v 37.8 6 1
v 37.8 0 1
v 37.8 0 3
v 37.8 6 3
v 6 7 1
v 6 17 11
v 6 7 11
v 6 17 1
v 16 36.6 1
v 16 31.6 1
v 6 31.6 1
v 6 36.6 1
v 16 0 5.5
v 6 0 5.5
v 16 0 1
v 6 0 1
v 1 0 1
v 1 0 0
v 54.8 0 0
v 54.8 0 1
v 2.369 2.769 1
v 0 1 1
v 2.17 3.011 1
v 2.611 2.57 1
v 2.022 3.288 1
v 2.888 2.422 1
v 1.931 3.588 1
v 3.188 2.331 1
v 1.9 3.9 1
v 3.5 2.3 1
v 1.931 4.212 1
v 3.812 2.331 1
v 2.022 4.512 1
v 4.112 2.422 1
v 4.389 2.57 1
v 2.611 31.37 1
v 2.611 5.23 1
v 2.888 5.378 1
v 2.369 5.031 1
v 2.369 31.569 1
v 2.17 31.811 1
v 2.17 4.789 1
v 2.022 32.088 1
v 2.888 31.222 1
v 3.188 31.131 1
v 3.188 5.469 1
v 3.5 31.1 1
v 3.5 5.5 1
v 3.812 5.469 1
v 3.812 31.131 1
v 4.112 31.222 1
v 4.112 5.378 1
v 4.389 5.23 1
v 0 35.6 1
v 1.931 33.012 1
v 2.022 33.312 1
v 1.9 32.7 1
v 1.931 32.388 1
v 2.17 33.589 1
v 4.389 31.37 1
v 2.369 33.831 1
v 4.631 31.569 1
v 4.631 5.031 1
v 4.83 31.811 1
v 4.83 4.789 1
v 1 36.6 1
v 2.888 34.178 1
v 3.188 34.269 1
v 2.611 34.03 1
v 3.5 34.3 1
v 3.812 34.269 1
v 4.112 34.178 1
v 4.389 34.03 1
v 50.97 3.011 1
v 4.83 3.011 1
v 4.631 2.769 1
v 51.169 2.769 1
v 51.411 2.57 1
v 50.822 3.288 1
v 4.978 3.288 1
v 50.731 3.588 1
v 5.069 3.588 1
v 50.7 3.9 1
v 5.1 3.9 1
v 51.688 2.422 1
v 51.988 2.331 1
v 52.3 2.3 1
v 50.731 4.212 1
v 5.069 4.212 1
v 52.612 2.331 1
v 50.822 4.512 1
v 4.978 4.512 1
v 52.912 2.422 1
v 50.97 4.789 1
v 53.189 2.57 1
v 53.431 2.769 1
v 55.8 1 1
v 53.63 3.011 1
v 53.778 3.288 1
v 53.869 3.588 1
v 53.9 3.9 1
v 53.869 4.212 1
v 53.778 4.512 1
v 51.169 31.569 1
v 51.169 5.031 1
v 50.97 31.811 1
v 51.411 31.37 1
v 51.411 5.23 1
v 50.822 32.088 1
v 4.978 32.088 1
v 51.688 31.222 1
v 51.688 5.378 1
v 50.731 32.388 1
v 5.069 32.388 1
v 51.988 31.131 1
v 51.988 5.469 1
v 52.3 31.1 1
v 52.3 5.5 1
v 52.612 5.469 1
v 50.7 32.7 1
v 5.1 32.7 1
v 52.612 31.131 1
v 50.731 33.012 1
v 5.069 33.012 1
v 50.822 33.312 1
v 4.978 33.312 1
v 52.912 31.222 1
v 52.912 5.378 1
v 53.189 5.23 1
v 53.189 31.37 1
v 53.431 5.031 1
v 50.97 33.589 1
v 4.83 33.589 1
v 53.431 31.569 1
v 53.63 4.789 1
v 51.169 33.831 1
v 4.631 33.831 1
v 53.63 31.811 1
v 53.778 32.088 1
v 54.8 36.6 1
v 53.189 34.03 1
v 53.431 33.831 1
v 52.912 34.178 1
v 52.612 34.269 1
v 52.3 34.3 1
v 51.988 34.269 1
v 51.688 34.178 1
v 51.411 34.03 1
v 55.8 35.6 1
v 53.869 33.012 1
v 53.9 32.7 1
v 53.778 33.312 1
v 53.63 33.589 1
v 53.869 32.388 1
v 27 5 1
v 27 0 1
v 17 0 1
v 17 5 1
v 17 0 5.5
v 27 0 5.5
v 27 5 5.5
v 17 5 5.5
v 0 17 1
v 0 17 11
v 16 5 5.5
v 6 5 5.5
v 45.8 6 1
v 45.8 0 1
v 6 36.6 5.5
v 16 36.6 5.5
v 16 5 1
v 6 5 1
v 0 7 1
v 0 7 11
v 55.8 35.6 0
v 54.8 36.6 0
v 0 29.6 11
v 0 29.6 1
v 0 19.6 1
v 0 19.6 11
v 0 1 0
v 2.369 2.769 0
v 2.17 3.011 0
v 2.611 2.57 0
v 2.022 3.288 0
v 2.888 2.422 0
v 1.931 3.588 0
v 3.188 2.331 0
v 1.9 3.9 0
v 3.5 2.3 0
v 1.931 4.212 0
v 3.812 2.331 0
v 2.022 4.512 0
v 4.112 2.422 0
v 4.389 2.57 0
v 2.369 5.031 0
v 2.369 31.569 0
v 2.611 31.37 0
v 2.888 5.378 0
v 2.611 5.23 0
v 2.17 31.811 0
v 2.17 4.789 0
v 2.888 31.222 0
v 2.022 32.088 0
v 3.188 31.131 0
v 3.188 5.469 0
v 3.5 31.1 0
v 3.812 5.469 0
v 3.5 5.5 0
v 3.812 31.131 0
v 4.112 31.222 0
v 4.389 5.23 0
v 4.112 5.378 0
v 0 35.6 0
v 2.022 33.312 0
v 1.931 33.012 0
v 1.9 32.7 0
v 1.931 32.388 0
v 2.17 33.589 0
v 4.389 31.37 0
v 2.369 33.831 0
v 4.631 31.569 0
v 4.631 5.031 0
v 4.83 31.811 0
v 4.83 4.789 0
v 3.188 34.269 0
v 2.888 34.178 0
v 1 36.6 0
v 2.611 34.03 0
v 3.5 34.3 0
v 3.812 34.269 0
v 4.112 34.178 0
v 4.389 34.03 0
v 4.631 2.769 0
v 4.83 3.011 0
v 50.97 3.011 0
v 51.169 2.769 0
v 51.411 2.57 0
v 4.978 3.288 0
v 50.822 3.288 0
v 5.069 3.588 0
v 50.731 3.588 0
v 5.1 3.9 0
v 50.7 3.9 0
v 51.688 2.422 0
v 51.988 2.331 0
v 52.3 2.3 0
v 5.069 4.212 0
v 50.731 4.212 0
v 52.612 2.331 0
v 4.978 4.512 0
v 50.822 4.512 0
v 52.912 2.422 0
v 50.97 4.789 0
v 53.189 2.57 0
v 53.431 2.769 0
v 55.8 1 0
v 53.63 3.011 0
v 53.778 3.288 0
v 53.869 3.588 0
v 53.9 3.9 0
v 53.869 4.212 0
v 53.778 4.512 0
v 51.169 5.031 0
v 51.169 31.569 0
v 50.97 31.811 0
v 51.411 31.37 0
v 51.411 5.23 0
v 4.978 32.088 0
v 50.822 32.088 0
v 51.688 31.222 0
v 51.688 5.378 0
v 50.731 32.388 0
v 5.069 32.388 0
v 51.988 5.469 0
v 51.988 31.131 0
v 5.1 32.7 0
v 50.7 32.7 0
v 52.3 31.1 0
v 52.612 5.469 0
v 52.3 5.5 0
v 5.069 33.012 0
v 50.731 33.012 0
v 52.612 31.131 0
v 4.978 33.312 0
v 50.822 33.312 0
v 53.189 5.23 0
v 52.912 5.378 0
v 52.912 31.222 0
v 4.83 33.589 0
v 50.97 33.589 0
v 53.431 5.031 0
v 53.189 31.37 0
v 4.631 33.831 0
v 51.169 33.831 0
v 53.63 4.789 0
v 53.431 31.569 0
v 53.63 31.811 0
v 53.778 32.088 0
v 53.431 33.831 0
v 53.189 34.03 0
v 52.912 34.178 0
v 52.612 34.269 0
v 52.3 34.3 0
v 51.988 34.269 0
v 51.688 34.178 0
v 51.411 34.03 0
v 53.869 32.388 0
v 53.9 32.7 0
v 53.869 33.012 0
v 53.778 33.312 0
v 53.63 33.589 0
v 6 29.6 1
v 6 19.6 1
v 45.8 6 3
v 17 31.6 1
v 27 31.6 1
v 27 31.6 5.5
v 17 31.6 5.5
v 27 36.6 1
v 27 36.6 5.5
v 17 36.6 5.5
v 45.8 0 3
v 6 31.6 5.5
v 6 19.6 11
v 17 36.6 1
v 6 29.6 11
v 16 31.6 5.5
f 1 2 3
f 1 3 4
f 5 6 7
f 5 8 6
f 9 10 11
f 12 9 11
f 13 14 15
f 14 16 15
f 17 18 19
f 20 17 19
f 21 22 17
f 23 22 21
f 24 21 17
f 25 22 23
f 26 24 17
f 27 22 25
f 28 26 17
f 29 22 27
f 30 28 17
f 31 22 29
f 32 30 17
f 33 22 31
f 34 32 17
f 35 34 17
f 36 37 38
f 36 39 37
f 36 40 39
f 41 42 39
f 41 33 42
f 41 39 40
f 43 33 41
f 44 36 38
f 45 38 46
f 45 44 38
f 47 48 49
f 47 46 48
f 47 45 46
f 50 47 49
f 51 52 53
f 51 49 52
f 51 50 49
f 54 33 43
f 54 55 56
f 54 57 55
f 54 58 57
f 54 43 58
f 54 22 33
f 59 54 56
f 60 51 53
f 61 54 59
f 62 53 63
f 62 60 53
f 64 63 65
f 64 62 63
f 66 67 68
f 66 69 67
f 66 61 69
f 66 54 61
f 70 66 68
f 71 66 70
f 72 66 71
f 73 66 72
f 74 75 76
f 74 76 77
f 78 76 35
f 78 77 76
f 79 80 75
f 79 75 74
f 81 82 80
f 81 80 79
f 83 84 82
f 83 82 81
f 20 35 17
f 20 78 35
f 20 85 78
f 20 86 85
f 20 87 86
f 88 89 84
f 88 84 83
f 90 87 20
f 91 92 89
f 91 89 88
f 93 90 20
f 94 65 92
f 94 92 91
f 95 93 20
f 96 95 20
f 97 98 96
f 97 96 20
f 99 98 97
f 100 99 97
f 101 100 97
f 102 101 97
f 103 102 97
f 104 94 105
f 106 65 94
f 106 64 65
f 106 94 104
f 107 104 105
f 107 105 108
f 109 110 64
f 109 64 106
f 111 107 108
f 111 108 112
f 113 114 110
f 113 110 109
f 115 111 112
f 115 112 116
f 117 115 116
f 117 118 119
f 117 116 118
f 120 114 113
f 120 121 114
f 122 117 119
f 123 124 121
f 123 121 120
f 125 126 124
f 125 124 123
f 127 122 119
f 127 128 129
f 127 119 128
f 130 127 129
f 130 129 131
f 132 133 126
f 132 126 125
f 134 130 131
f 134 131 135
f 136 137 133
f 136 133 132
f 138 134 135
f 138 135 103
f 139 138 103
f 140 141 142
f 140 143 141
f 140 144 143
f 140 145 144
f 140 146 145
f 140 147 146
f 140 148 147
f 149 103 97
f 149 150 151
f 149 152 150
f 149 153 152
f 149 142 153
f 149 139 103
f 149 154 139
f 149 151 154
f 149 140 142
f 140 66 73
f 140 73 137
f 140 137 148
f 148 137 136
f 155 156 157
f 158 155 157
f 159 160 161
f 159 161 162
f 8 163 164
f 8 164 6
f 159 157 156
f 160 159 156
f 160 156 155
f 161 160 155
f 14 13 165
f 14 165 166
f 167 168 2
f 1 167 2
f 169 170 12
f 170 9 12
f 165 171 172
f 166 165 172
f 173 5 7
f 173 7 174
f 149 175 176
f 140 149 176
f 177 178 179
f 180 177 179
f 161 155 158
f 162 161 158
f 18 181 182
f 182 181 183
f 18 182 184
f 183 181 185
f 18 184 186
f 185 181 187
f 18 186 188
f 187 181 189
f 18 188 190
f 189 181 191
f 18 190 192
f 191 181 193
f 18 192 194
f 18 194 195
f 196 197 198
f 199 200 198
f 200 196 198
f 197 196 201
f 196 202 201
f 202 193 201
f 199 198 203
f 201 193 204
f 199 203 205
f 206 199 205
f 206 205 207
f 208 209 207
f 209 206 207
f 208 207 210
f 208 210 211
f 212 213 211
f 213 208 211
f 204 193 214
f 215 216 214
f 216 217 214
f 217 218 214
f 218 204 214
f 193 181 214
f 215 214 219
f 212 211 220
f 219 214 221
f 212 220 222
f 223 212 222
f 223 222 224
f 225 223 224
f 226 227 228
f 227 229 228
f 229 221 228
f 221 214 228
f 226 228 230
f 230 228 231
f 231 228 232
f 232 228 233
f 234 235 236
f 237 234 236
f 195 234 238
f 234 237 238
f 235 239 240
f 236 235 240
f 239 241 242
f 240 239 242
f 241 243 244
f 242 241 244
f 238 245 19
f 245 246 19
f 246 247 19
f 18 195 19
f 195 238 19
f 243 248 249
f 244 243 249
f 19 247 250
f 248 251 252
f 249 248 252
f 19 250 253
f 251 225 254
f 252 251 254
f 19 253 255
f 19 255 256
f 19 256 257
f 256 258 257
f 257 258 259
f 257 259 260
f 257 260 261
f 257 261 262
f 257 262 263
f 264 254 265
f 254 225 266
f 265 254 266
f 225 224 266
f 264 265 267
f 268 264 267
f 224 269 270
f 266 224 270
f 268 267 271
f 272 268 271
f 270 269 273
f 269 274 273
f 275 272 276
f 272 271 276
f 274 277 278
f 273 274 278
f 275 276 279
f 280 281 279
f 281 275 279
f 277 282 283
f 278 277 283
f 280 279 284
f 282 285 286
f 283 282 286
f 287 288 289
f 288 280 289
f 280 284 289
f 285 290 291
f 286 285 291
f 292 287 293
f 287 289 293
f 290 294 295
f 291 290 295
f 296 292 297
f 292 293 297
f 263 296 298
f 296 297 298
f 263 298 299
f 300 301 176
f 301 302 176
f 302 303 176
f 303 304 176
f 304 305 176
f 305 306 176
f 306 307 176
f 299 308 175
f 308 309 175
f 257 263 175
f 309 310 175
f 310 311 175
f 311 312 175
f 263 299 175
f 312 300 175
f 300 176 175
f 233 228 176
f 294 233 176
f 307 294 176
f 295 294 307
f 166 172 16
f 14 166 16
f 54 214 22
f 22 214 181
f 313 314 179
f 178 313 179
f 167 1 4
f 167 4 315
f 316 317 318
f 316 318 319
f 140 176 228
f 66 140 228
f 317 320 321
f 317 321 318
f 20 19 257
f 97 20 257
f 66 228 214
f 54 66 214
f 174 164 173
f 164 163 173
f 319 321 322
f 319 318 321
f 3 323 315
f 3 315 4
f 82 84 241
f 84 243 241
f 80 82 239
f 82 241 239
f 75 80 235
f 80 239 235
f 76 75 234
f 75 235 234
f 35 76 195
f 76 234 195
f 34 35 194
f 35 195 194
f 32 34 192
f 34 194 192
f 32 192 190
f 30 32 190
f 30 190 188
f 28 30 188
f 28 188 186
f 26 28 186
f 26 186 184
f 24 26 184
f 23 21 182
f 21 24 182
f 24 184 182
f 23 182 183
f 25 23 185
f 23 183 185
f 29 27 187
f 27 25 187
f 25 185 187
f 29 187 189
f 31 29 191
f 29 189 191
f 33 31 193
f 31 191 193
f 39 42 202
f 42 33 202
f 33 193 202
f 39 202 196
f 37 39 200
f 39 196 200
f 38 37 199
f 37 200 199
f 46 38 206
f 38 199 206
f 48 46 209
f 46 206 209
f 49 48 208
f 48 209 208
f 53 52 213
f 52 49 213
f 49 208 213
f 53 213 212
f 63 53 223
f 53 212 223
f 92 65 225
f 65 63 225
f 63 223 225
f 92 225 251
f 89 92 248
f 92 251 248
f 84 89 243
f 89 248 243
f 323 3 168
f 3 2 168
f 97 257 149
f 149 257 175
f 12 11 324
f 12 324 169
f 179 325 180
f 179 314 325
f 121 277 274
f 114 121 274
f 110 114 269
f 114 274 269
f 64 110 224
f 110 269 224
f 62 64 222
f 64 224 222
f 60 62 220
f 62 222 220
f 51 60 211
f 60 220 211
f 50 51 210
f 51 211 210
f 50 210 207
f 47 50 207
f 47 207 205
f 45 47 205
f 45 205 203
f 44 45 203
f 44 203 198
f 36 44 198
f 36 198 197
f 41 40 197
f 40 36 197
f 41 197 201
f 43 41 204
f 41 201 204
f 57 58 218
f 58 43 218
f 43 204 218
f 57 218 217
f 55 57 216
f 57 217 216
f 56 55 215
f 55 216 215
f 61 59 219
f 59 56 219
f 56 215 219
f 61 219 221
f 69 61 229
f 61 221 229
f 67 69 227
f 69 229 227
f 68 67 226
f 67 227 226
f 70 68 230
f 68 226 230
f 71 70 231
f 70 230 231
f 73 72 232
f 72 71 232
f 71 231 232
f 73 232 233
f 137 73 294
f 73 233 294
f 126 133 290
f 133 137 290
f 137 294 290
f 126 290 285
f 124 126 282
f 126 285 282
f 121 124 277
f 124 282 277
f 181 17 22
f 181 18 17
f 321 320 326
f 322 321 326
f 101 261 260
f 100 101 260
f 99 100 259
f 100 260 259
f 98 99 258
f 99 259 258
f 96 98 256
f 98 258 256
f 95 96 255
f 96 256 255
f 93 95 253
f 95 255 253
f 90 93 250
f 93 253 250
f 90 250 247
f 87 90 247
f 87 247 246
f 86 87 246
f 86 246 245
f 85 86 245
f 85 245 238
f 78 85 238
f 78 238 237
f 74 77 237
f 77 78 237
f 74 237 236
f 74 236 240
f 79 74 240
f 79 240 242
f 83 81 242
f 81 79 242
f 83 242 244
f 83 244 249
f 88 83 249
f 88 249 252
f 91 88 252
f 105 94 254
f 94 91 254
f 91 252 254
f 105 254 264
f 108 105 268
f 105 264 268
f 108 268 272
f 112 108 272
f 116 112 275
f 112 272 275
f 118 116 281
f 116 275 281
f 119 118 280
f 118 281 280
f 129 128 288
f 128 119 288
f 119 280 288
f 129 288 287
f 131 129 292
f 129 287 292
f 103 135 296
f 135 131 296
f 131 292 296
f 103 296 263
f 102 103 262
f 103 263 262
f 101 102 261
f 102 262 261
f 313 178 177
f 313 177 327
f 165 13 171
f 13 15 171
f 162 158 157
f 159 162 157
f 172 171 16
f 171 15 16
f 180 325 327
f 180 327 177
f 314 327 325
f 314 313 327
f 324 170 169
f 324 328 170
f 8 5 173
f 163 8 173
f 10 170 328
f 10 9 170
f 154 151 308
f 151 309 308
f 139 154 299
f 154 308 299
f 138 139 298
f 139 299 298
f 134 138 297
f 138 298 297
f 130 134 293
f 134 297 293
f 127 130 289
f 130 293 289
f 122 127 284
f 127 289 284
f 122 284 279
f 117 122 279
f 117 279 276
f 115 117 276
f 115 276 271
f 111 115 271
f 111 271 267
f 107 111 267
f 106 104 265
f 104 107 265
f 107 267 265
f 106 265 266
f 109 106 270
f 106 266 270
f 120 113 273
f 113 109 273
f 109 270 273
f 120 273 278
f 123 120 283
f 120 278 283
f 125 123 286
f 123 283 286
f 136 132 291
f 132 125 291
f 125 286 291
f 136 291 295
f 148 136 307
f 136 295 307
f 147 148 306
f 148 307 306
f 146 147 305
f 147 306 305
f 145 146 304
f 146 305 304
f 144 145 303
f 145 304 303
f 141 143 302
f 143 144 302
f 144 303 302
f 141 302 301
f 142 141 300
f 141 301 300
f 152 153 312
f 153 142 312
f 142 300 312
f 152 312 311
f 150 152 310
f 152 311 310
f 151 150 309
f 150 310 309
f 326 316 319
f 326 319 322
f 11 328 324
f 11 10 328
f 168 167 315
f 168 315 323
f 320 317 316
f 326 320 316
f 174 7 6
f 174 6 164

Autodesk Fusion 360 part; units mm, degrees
sketch "草图1" plane through (0, 0, 0) normal (0, 0, 1) x (1, 0, 0)
  line L0 (1, 0) -> (54.8, 0)
  line L1 (55.8, 1) -> (55.8, 35.6)
  line L2 (54.8, 36.6) -> (1, 36.6)
  line L3 (0, 35.6) -> (0, 1)
  line L4 (-8.6099, 18.3) -> (78, 18.3)
  line L5 (27.9, 45) -> (27.9, -14)
  circle A0 centre (3.5, 32.7) radius 1.6
  circle A1 centre (52.3, 32.7) radius 1.6
  circle A2 centre (3.5, 3.9) radius 1.6
  circle A3 centre (52.3, 3.9) radius 1.6
  line L6 (55.8, 35.6) -> (54.8, 36.6)
  line L7 (54.8, 0) -> (55.8, 1)
  line L8 (1, 36.6) -> (0, 35.6)
  line L9 (1, 0) -> (0, 1)
  point P0 (55.8, 0)
  point P1 (55.8, 36.6)
  point P2 (0, 36.6)
  dimension "d1" = 55.8
  dimension "d2" = 36.6
  dimension "d3" = 3.2
  dimension "d4" = 48.8
  dimension "d5" = 28.8
  dimension "d6" = 1
  dimension "d7" = 1
  dimension "d8" = 1
  dimension "d9" = 1
  dimension "d10" = 1
  dimension "d11" = 1
  dimension "d12" = 1
  dimension "d13" = 1
extrude "拉伸1" add sketch "草图1" along normal blind 1 makes body 1
sketch "草图2" plane through (0, 0, 1) normal (0, 0, 1) x (-1, 0, 0)
  circle A0 centre (-3.5, -3.9) radius 1.6
  circle A1 centre (-52.3, -32.7) radius 1.6
  circle A2 centre (-3.5, -32.7) radius 1.6
  circle A3 centre (-52.3, -3.9) radius 1.6
  line L0 (-54.8, 0) -> (-55.8, -1)
  line L1 (-55.8, -1) -> (-55.8, -35.6)
  line L2 (-55.8, -35.6) -> (-54.8, -36.6)
  line L3 (-54.8, -36.6) -> (-1, -36.6)
  line L4 (-1, -36.6) -> (0, -35.6)
  line L5 (0, -35.6) -> (0, -1)
  line L6 (0, -1) -> (-1, 0)
  line L7 (-1, 0) -> (-54.8, 0)
  line L8 (0, -29.6) -> (-6, -29.6)
  line L9 (-6, -29.6) -> (-6, -19.6)
  line L10 (-6, -19.6) -> (0, -19.6)
  line L11 (0, -19.6) -> (0, -29.6)
  line L12 (0, -17) -> (-6, -17)
  line L13 (-6, -17) -> (-6, -7)
  line L14 (-6, -7) -> (0, -7)
  line L15 (0, -7) -> (0, -17)
  dimension "d16" = 6
  dimension "d17" = 6
  dimension "d18" = 10
  dimension "d19" = 10
  dimension "d20" = 7
  dimension "d21" = 7
extrude "拉伸2" add sketch "草图2" along normal blind 10 separate body contours L5 L12 L13 L14 L15 | L5 L8 L9 L10 L11 makes body 2 at (0, 13.6667, 4.3333) makes body 3 at (0, 26.2667, 4.3333)
sketch "草图3" plane through (0, 0, 1) normal (0, 0, 1) x (-1, 0, 0)
  circle A0 centre (-3.5, -3.9) radius 1.6
  circle A1 centre (-52.3, -32.7) radius 1.6
  circle A2 centre (-3.5, -32.7) radius 1.6
  circle A3 centre (-52.3, -3.9) radius 1.6
  line L0 (-54.8, 0) -> (-55.8, -1)
  line L1 (-55.8, -1) -> (-55.8, -35.6)
  line L2 (-55.8, -35.6) -> (-54.8, -36.6)
  line L3 (-54.8, -36.6) -> (-1, -36.6)
  line L4 (-1, -36.6) -> (0, -35.6)
  line L5 (0, -35.6) -> (0, -1)
  line L6 (0, -1) -> (-1, 0)
  line L7 (-1, 0) -> (-54.8, 0)
  line L8 (-6, -36.6) -> (-16, -36.6)
  line L9 (-16, -36.6) -> (-16, -31.6)
  line L10 (-16, -31.6) -> (-6, -31.6)
  line L11 (-6, -31.6) -> (-6, -36.6)
  line L12 (-17, -36.6) -> (-27, -36.6)
  line L13 (-27, -36.6) -> (-27, -31.6)
  line L14 (-27, -31.6) -> (-17, -31.6)
  line L15 (-17, -31.6) -> (-17, -36.6)
  line L16 (-6, 0) -> (-16, 0)
  line L17 (-16, 0) -> (-16, -5)
  line L18 (-16, -5) -> (-6, -5)
  line L19 (-6, -5) -> (-6, 0)
  line L20 (-17, 0) -> (-27, 0)
  line L21 (-27, 0) -> (-27, -5)
  line L22 (-27, -5) -> (-17, -5)
  line L23 (-17, -5) -> (-17, 0)
  dimension "d24" = 5
  dimension "d25" = 5
  dimension "d26" = 5
  dimension "d27" = 5
  dimension "d28" = 10
  dimension "d29" = 10
  dimension "d30" = 10
  dimension "d31" = 10
  dimension "d32" = 6
  dimension "d33" = 6
  dimension "d34" = 1
  dimension "d35" = 1
extrude "拉伸3" add sketch "草图3" along normal blind 4.5 separate body contours L7 L20 L21 L22 L23 | L7 L16 L17 L18 L19 | L3 L12 L13 L14 L15 | L3 L8 L9 L10 L11 makes body 4 at (23.6667, 33.2667, 1) makes body 5 at (9.3333, 3.3333, 1) makes body 6 at (12.6667, 33.2667, 1) makes body 7 at (23.6667, 3.3333, 1)
sketch "草图4" plane through (0, 0, 1) normal (0, 0, 1) x (-1, 0, 0)
  circle A0 centre (-3.5, -3.9) radius 1.6
  circle A1 centre (-52.3, -32.7) radius 1.6
  circle A2 centre (-3.5, -32.7) radius 1.6
  circle A3 centre (-52.3, -3.9) radius 1.6
  line L0 (-54.8, 0) -> (-55.8, -1)
  line L1 (-55.8, -1) -> (-55.8, -35.6)
  line L2 (-55.8, -35.6) -> (-54.8, -36.6)
  line L3 (-54.8, -36.6) -> (-1, -36.6)
  line L4 (-1, -36.6) -> (0, -35.6)
  line L5 (0, -35.6) -> (0, -1)
  line L6 (0, -1) -> (-1, 0)
  line L7 (-1, 0) -> (-54.8, 0)
  line L8 (-37.8, -6) -> (-45.8, -6)
  line L9 (-45.8, -6) -> (-45.8, 0)
  line L10 (-45.8, 0) -> (-37.8, 0)
  line L11 (-37.8, 0) -> (-37.8, -6)
  dimension "d38" = 8
  dimension "d39" = 6
  dimension "d40" = 10
extrude "拉伸4" add sketch "草图4" along normal blind 2 separate body contours L7 L8 L9 L10 L11 makes body 8
copy_body "实体->零部件1" bodies 1 removing the originals makes body 9 in component "Component'"
copy_body "实体->零部件2" bodies 2 removing the originals makes body 10 in component "Component''"
copy_body "实体->零部件3" bodies 3 removing the originals makes body 11 in component "Component'''"
copy_body "实体->零部件4" bodies 4 removing the originals makes body 12 in component "Component''''"
copy_body "实体->零部件5" bodies 5 removing the originals makes body 13 in component "Component'''''"
copy_body "实体->零部件6" bodies 6 removing the originals makes body 14 in component "Component''''''"
copy_body "实体->零部件7" bodies 7 removing the originals makes body 15 in component "Component'''''''"
copy_body "实体->零部件8" bodies 8 removing the originals makes body 16 in component "Component''''''''"
component "Component'" placed x (1, 0, 0) y (0, 1, 0) z (0, 0, 1) at (0, 0, 0)
component "Component''" placed x (1, 0, 0) y (0, 1, 0) z (0, 0, 1) at (0, 0, 0)
component "Component'''" placed x (1, 0, 0) y (0, 1, 0) z (0, 0, 1) at (0, 0, 0)
component "Component''''" placed x (1, 0, 0) y (0, 1, 0) z (0, 0, 1) at (0, 0, 0)
component "Component'''''" placed x (1, 0, 0) y (0, 1, 0) z (0, 0, 1) at (0, 0, 0)
component "Component''''''" placed x (1, 0, 0) y (0, 1, 0) z (0, 0, 1) at (0, 0, 0)
component "Component'''''''" placed x (1, 0, 0) y (0, 1, 0) z (0, 0, 1) at (0, 0, 0)
component "Component''''''''" placed x (1, 0, 0) y (0, 1, 0) z (0, 0, 1) at (0, 0, 0)
equation "d7 = d6"
equation "d9 = d8"
equation "d11 = d10"
equation "d13 = d12"
